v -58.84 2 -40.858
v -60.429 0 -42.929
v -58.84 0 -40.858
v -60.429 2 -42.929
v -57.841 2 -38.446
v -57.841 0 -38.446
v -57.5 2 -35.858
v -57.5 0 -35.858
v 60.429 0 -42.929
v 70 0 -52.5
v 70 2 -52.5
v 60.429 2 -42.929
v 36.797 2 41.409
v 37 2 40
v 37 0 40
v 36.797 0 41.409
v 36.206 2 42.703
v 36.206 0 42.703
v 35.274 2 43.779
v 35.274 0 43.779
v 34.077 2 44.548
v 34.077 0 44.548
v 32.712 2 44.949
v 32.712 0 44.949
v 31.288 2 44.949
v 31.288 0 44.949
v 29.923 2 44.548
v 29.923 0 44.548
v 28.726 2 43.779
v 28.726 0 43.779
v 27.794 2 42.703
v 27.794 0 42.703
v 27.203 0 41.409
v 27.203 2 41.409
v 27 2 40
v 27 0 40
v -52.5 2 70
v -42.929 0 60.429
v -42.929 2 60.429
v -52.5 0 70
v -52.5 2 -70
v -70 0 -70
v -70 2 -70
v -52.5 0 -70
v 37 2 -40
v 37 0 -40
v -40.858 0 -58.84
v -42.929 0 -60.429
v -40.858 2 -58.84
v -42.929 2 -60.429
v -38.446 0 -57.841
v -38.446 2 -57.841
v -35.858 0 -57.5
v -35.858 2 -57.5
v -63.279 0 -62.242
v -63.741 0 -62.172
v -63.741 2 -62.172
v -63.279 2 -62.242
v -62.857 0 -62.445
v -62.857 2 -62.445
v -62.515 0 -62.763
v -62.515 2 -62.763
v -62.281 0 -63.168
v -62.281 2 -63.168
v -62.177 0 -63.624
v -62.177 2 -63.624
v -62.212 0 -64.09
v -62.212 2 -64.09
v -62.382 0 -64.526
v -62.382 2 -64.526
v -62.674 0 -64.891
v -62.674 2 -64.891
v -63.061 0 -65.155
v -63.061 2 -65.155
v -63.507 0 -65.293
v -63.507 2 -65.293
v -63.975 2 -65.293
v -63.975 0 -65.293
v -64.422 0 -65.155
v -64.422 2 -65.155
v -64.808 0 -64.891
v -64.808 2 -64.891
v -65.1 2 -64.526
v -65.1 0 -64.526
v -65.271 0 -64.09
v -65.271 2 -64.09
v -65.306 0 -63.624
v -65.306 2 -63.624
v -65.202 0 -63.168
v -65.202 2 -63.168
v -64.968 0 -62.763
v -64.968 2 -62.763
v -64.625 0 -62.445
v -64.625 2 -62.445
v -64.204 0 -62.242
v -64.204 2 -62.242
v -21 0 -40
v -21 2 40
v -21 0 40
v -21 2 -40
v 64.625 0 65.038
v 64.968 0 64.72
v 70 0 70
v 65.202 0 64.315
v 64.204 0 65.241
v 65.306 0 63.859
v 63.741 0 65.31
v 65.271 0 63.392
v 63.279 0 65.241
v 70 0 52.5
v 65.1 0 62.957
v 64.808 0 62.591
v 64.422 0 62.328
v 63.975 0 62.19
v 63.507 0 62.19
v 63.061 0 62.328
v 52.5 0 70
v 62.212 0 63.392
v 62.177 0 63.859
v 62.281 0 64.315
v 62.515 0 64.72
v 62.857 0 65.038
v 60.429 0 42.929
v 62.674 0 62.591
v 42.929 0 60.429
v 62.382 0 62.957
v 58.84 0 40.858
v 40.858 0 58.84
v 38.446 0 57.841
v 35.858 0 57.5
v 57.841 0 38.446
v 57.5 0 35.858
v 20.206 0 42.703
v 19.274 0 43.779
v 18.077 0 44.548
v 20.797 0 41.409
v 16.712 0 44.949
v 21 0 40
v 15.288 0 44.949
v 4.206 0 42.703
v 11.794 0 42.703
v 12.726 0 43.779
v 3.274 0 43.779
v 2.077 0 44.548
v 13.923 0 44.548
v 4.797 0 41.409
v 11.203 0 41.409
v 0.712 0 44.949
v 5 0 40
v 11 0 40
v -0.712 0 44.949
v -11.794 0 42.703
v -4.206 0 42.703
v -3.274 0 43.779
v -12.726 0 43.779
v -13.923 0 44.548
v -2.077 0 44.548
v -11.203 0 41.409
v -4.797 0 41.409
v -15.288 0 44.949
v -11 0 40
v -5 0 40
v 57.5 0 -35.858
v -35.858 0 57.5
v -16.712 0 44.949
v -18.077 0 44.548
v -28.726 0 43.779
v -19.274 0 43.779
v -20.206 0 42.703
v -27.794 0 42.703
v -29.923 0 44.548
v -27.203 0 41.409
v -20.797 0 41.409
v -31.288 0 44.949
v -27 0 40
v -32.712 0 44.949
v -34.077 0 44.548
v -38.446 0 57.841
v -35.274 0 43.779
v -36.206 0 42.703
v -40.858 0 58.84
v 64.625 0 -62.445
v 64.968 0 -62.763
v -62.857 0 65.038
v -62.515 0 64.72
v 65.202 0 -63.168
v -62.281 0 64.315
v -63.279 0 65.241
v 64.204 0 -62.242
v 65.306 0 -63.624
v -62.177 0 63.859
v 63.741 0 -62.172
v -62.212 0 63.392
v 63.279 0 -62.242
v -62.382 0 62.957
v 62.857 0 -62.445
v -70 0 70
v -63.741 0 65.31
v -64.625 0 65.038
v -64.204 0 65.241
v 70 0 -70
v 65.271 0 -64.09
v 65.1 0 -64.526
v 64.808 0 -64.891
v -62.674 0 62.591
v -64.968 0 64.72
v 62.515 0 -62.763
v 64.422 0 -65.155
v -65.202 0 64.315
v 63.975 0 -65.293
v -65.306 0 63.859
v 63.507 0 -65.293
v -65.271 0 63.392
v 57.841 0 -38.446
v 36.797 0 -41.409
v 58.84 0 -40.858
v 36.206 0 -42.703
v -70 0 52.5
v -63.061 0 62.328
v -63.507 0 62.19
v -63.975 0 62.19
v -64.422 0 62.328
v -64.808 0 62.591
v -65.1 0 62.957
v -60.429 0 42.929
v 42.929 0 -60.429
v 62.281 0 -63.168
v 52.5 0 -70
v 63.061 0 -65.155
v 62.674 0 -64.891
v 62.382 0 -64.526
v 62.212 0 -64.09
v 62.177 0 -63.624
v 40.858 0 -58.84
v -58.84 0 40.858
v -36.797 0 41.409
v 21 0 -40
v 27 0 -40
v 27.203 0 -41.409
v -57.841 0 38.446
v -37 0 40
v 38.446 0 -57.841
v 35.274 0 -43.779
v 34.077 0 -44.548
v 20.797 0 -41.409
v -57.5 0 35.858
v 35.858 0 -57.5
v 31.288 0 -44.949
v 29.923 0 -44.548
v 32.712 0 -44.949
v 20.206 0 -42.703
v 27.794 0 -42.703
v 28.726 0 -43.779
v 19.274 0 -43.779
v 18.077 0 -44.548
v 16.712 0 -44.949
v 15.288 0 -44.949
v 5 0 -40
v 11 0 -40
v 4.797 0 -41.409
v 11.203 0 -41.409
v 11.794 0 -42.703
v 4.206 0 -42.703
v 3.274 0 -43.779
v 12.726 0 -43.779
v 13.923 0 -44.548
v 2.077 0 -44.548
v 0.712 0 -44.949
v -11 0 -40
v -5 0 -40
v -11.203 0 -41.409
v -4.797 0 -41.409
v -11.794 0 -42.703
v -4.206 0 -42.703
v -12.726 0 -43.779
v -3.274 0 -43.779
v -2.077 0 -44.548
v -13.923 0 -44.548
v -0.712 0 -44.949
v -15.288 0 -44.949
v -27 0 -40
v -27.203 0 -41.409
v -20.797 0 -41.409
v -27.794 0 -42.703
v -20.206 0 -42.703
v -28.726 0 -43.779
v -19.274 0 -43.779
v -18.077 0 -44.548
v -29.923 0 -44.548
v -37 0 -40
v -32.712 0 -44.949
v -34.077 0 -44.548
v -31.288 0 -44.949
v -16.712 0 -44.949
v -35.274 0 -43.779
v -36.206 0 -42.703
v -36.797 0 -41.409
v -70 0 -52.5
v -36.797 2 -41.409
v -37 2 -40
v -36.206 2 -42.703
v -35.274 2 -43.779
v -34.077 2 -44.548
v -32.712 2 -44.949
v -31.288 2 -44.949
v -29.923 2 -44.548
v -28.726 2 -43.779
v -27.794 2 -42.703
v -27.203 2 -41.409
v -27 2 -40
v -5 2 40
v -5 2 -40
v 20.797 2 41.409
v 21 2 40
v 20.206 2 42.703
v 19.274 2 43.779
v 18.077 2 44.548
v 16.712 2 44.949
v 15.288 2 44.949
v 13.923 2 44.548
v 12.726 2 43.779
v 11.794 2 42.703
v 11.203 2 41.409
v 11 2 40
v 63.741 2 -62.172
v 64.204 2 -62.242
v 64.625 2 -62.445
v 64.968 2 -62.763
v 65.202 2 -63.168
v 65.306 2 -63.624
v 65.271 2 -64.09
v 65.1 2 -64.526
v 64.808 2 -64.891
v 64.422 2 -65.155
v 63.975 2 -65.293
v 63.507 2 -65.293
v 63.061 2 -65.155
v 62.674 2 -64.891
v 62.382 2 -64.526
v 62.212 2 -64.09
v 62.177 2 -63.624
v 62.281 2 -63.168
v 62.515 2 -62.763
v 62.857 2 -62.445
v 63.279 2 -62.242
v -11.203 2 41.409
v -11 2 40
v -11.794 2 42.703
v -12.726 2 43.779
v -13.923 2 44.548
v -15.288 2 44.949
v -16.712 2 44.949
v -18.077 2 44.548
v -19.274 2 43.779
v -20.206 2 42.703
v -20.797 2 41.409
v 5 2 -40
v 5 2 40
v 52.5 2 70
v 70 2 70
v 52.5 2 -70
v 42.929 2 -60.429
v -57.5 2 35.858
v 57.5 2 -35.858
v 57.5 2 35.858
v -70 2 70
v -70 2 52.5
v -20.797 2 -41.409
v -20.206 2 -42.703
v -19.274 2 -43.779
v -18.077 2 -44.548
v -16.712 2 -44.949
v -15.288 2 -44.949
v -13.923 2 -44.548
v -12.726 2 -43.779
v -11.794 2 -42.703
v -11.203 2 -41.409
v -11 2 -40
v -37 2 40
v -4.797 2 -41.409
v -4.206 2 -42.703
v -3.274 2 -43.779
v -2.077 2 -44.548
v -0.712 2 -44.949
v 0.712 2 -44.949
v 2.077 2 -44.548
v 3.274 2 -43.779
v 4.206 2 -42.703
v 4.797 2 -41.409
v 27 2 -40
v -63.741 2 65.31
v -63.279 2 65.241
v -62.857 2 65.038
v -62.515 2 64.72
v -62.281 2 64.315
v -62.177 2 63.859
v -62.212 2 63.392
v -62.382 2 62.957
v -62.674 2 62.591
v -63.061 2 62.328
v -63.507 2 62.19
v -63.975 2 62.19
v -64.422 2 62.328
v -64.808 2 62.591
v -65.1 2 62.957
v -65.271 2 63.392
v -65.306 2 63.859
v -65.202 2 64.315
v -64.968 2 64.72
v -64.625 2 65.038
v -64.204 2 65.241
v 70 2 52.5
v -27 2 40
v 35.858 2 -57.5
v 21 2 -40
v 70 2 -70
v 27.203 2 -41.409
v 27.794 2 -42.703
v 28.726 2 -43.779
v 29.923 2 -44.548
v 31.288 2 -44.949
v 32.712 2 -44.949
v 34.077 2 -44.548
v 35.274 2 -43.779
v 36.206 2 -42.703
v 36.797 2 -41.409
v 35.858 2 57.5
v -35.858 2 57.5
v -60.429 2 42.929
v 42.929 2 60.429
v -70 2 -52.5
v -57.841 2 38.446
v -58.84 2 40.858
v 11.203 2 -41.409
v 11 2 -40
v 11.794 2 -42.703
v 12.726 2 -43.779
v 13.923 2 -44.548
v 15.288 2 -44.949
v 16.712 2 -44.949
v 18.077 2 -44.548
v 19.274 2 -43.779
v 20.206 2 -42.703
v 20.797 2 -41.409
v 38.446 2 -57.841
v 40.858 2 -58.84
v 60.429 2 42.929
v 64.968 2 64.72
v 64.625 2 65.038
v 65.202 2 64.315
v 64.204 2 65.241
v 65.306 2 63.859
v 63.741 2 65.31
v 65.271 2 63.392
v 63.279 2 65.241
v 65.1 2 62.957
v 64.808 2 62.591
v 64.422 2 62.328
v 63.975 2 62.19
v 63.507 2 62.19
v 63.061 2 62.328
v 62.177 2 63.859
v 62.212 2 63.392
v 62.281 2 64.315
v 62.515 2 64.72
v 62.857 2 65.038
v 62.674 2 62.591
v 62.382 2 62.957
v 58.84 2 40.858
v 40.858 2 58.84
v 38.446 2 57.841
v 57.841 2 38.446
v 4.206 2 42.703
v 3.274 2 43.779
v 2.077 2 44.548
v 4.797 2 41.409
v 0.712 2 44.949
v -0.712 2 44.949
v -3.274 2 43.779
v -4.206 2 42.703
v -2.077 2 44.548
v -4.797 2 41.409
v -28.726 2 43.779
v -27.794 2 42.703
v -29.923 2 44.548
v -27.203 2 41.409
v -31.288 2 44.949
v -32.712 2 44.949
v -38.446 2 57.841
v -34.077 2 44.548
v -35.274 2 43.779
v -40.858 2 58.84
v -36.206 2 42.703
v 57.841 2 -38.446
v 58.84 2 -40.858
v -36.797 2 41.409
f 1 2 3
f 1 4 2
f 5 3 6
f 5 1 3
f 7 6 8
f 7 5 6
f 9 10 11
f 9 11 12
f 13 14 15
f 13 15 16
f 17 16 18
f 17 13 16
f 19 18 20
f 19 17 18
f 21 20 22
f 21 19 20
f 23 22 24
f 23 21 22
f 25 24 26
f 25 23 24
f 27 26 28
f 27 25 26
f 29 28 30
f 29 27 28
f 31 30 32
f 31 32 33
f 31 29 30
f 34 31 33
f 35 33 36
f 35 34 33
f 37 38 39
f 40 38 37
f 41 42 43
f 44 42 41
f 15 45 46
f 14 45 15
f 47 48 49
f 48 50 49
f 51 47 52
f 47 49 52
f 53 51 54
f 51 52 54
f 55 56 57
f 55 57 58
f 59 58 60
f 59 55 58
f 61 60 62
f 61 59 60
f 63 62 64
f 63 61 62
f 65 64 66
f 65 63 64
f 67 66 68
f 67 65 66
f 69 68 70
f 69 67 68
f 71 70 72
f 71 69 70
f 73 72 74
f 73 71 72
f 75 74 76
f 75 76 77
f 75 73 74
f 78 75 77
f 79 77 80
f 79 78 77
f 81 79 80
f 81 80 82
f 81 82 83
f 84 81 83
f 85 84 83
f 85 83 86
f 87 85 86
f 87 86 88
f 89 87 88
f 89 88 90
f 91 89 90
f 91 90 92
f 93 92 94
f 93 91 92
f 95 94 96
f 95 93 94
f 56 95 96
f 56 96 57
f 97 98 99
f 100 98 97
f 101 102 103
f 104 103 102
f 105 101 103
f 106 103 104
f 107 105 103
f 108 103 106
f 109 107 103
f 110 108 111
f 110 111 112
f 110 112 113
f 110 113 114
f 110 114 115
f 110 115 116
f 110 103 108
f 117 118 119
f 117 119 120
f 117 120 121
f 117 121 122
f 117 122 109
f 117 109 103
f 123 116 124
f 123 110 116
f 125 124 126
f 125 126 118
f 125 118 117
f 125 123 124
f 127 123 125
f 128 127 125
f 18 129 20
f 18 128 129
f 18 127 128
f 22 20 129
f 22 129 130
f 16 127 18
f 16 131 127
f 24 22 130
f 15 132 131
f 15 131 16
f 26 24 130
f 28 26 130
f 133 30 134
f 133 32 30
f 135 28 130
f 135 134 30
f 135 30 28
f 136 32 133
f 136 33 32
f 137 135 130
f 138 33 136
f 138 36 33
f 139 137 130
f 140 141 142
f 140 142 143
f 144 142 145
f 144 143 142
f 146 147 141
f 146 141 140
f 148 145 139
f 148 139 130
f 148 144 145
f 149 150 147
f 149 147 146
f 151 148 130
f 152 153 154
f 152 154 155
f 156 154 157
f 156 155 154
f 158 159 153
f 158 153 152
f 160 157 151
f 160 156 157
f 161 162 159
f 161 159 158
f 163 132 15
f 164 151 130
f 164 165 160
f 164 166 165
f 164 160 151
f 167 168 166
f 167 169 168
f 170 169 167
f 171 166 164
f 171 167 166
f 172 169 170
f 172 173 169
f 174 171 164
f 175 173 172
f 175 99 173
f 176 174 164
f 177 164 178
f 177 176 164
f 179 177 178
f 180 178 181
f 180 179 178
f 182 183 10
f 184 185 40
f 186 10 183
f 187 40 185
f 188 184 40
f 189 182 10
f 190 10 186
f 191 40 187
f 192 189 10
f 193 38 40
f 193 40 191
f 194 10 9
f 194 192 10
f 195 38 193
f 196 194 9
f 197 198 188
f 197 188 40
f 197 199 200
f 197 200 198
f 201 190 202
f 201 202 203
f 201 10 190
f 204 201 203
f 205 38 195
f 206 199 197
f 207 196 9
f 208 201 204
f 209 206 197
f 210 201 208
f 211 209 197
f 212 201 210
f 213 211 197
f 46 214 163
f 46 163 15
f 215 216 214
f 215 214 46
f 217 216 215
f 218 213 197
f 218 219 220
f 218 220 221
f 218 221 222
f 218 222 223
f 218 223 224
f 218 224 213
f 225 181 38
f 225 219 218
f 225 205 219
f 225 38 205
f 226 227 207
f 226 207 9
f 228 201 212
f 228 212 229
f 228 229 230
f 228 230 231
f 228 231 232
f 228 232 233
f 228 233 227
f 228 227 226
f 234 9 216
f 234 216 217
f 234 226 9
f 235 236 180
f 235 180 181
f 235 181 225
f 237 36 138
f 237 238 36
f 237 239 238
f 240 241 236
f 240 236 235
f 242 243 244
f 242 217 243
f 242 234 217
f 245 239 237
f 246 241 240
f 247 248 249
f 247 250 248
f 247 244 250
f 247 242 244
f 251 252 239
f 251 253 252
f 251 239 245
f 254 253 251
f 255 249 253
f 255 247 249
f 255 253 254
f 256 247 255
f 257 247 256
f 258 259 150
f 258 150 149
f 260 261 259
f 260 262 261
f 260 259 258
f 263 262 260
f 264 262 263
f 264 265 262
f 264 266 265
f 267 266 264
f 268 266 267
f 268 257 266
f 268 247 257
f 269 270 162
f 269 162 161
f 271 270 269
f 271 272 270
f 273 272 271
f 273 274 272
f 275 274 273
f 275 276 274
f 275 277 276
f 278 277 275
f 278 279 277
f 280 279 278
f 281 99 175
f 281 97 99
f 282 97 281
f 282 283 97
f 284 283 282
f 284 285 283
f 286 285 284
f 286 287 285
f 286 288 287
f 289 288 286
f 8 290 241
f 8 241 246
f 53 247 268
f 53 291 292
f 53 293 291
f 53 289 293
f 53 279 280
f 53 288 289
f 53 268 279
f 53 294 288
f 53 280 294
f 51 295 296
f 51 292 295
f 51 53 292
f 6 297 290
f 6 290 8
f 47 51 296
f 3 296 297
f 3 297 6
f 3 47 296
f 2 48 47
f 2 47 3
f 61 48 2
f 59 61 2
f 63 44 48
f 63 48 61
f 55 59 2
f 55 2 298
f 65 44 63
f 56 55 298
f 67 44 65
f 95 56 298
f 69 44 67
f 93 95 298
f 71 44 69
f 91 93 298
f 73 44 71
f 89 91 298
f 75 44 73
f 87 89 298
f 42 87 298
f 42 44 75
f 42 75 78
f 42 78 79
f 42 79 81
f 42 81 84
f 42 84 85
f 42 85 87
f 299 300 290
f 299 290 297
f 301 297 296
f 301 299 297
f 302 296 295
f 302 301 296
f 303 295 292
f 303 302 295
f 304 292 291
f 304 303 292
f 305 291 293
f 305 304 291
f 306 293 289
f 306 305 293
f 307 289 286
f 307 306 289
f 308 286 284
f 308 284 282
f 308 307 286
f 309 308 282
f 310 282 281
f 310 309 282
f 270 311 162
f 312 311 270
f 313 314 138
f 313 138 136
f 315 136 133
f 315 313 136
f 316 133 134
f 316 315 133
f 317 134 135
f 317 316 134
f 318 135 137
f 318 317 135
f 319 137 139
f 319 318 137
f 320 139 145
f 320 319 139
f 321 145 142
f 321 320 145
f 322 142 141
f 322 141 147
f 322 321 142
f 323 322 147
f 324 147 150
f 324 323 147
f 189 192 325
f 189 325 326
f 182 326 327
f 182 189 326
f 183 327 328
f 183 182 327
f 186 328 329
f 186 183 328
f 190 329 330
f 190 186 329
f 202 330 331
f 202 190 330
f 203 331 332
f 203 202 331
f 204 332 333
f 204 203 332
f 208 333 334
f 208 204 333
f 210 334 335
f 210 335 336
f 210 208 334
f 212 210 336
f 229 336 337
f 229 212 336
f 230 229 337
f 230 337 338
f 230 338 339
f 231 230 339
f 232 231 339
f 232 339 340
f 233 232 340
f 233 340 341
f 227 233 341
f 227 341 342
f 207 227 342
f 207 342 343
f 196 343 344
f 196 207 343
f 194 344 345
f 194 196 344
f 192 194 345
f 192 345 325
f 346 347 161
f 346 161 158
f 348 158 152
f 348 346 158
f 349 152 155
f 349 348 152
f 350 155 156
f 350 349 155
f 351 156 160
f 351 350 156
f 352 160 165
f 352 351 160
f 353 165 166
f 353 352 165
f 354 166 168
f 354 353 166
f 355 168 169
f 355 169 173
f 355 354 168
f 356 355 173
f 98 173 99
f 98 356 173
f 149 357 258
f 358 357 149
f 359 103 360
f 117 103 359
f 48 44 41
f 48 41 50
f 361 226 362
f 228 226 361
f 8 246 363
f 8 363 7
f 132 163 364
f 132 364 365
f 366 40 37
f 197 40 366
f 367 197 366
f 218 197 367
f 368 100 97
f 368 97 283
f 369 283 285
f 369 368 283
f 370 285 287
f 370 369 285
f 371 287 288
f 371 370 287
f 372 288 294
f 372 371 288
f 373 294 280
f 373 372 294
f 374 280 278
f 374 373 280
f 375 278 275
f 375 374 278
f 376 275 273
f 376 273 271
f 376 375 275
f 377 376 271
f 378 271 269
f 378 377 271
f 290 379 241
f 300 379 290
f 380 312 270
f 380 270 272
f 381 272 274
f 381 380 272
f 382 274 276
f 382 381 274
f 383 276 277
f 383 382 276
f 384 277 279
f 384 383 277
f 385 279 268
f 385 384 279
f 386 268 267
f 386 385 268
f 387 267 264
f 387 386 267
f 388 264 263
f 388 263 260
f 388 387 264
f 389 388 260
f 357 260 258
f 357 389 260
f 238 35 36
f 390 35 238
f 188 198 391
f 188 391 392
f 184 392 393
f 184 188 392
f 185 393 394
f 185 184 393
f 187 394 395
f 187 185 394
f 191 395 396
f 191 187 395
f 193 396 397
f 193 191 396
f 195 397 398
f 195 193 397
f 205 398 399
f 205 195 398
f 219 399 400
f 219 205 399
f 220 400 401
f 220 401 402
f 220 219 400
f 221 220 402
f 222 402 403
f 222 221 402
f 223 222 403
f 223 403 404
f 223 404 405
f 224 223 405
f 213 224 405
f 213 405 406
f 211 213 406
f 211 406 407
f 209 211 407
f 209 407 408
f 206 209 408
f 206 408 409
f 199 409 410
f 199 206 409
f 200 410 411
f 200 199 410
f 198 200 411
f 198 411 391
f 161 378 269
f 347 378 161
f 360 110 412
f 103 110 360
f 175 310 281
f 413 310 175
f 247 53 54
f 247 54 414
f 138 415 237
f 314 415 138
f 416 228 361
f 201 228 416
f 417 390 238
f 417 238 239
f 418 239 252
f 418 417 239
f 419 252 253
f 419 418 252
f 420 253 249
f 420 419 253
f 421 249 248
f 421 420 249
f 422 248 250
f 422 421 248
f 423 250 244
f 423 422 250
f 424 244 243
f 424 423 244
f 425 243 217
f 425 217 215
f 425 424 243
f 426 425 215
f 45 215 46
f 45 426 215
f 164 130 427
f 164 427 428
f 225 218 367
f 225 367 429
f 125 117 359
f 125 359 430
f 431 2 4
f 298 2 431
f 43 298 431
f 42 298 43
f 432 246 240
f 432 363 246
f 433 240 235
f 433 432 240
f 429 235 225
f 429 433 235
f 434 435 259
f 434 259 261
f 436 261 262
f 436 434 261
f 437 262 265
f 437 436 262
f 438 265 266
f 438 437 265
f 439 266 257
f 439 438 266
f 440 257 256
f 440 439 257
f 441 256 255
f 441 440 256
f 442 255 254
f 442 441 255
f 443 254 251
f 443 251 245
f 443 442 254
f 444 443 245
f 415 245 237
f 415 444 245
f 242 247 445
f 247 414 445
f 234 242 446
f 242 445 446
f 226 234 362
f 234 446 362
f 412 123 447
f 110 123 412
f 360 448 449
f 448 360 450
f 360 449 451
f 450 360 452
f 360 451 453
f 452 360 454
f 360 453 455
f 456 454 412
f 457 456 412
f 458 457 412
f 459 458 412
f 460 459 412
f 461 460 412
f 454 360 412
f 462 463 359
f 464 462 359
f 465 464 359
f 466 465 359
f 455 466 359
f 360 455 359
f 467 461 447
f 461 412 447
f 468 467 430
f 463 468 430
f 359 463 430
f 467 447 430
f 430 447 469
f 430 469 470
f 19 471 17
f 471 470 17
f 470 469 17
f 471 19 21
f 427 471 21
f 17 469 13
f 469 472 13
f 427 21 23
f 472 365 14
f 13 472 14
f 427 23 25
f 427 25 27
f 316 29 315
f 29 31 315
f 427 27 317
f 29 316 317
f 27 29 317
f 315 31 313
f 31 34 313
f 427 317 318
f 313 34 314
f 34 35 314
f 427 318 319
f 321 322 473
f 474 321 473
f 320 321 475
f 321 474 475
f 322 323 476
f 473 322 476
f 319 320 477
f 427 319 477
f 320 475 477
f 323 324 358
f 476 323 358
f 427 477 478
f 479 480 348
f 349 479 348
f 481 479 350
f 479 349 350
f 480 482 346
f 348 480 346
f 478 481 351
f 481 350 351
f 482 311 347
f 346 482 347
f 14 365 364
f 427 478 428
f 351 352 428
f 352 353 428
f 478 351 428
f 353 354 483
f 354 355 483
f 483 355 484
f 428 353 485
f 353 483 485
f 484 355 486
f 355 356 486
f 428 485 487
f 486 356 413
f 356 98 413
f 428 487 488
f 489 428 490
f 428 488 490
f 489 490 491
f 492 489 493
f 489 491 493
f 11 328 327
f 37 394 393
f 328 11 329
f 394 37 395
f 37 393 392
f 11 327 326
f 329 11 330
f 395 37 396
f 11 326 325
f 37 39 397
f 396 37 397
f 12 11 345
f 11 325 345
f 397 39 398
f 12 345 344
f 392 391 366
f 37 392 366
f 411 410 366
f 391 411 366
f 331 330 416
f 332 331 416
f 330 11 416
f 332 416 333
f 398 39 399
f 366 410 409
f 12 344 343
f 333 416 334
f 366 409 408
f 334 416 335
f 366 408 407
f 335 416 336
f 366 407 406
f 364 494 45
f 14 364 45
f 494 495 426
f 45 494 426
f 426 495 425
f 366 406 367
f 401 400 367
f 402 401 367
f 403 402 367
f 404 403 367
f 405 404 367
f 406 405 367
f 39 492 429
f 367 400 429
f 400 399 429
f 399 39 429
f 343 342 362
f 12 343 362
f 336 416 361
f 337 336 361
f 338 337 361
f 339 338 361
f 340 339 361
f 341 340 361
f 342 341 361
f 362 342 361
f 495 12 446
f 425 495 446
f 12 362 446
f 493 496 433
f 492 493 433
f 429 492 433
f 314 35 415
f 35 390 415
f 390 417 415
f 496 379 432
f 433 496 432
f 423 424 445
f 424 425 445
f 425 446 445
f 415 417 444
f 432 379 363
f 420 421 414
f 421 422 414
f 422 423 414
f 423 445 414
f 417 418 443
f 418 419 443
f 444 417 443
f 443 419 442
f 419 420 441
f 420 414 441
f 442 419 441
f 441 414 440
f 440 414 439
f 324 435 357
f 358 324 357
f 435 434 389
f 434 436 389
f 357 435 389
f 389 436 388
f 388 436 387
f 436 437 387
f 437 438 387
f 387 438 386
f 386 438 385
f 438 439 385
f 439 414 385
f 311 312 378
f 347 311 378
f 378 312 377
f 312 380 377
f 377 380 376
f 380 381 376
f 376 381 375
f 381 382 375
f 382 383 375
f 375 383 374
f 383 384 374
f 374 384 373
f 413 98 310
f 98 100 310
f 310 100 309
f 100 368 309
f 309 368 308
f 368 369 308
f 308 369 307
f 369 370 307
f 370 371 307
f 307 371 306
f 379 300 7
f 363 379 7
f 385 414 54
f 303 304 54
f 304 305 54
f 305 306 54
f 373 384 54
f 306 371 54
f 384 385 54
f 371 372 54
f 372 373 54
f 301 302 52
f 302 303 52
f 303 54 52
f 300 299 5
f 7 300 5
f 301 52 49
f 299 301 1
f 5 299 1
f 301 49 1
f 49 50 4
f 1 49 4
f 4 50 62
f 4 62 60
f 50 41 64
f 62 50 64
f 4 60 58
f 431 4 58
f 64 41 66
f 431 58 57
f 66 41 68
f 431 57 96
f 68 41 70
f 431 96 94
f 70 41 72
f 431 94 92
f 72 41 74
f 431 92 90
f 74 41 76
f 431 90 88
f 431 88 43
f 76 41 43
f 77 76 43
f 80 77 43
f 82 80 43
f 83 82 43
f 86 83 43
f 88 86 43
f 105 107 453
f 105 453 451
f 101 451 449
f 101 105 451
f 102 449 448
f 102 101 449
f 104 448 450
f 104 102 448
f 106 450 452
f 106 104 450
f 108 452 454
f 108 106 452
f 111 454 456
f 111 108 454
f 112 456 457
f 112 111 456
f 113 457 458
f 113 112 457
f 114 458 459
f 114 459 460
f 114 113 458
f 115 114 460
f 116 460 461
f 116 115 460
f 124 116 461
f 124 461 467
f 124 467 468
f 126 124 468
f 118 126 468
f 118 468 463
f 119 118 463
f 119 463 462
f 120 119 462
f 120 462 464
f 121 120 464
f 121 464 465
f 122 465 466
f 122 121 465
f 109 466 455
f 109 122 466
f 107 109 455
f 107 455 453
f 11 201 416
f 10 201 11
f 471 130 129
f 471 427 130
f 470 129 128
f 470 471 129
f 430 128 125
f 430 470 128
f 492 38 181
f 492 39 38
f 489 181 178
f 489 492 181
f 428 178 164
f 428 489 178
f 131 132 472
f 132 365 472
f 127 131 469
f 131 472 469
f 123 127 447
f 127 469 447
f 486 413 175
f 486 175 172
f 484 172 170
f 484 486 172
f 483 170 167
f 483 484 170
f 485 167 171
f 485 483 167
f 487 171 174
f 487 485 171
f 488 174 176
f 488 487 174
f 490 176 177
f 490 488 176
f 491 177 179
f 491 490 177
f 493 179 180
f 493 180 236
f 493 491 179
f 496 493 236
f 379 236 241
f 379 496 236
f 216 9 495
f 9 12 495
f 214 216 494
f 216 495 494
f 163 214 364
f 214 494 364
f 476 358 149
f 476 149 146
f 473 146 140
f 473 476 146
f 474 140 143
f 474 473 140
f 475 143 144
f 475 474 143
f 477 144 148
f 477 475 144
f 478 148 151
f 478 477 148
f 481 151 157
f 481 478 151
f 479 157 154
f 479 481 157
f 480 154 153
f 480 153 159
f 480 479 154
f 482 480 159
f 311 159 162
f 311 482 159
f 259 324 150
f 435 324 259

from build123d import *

# Parameters (mm, degrees)
SKETCH_1_R          = 1.569016128
EXTRUDE_1_DEPTH     = 2
FILLET_1_R          = 10
CUT_EXTRUDE_1_DEPTH = 2


with BuildPart() as part:
    # 草图1 → 凸台-拉伸1 (new body)
    with BuildSketch(Plane(origin=(0, 0, 0), x_dir=(1, 0, 0), z_dir=(0, 1, 0))):
        Polygon((-52.5, 70), (-40, 57.5), (40, 57.5), (52.5, 70), (70, 70), (70, 52.5), (57.5, 40), (57.5, -40), (70, -52.5), (70, -70), (52.5, -70), (40, -57.5), (-40, -57.5), (-52.5, -70), (-70, -70), (-70, -52.5), (-57.5, -40), (-57.5, 40), (-70, 52.5), (-70, 70), align=None)
        with Locations(Location((-63.74128019, 63.74128019, 0), (0, 0, 270))):
            Circle(SKETCH_1_R, mode=Mode.SUBTRACT)
        with Locations(Location((63.74128019, 63.74128019, 0), (0, 0, 270))):
            Circle(SKETCH_1_R, mode=Mode.SUBTRACT)
        with Locations(Location((63.74128019, -63.74128019, 0), (0, 0, 270))):
            Circle(SKETCH_1_R, mode=Mode.SUBTRACT)
        with Locations(Location((-63.74128019, -63.74128019, 0), (0, 0, 270))):
            Circle(SKETCH_1_R, mode=Mode.SUBTRACT)
    extrude(amount=EXTRUDE_1_DEPTH)

    # 圆角1
    fillet_1_edges = [part.edges().sort_by_distance(p)[0] for p in [
        (57.5, 1, -40),
        (57.5, 1, 40),
        (40, 1, 57.5),
        (-40, 1, 57.5),
        (-57.5, 1, 40),
        (-57.5, 1, -40),
        (-40, 1, -57.5),
        (40, 1, -57.5),
    ]]
    fillet(fillet_1_edges, radius=FILLET_1_R)

    # 草图2 → 切除-拉伸1 (cut)
    with BuildSketch(Plane(origin=(0, 2, 0), x_dir=(1, 0, 0), z_dir=(0, 1, 0))):
        with BuildLine():
            Line((-5, -40), (-5, 40))
            ThreePointArc((-5, 40), (0, 45), (5, 40))
            Line((5, 40), (5, -40))
            ThreePointArc((5, -40), (0, -45), (-5, -40))
        make_face()
        with BuildLine():
            Line((11, -40), (11, 40))
            ThreePointArc((11, 40), (16, 45), (21, 40))
            Line((21, 40), (21, -40))
            ThreePointArc((21, -40), (16, -45), (11, -40))
        make_face()
        with BuildLine():
            Line((27, -40), (27, 40))
            ThreePointArc((27, 40), (32, 45), (37, 40))
            Line((37, 40), (37, -40))
            ThreePointArc((37, -40), (32, -45), (27, -40))
        make_face()
        with BuildLine():
            Line((-21, -40), (-21, 40))
            ThreePointArc((-21, 40), (-16, 45), (-11, 40))
            Line((-11, 40), (-11, -40))
            ThreePointArc((-11, -40), (-16, -45), (-21, -40))
        make_face()
        with BuildLine():
            Line((-37, -40), (-37, 40))
            ThreePointArc((-37, 40), (-32, 45), (-27, 40))
            Line((-27, 40), (-27, -40))
            ThreePointArc((-27, -40), (-32, -45), (-37, -40))
        make_face()
    extrude(amount=-CUT_EXTRUDE_1_DEPTH, mode=Mode.SUBTRACT)


solid = part.part
